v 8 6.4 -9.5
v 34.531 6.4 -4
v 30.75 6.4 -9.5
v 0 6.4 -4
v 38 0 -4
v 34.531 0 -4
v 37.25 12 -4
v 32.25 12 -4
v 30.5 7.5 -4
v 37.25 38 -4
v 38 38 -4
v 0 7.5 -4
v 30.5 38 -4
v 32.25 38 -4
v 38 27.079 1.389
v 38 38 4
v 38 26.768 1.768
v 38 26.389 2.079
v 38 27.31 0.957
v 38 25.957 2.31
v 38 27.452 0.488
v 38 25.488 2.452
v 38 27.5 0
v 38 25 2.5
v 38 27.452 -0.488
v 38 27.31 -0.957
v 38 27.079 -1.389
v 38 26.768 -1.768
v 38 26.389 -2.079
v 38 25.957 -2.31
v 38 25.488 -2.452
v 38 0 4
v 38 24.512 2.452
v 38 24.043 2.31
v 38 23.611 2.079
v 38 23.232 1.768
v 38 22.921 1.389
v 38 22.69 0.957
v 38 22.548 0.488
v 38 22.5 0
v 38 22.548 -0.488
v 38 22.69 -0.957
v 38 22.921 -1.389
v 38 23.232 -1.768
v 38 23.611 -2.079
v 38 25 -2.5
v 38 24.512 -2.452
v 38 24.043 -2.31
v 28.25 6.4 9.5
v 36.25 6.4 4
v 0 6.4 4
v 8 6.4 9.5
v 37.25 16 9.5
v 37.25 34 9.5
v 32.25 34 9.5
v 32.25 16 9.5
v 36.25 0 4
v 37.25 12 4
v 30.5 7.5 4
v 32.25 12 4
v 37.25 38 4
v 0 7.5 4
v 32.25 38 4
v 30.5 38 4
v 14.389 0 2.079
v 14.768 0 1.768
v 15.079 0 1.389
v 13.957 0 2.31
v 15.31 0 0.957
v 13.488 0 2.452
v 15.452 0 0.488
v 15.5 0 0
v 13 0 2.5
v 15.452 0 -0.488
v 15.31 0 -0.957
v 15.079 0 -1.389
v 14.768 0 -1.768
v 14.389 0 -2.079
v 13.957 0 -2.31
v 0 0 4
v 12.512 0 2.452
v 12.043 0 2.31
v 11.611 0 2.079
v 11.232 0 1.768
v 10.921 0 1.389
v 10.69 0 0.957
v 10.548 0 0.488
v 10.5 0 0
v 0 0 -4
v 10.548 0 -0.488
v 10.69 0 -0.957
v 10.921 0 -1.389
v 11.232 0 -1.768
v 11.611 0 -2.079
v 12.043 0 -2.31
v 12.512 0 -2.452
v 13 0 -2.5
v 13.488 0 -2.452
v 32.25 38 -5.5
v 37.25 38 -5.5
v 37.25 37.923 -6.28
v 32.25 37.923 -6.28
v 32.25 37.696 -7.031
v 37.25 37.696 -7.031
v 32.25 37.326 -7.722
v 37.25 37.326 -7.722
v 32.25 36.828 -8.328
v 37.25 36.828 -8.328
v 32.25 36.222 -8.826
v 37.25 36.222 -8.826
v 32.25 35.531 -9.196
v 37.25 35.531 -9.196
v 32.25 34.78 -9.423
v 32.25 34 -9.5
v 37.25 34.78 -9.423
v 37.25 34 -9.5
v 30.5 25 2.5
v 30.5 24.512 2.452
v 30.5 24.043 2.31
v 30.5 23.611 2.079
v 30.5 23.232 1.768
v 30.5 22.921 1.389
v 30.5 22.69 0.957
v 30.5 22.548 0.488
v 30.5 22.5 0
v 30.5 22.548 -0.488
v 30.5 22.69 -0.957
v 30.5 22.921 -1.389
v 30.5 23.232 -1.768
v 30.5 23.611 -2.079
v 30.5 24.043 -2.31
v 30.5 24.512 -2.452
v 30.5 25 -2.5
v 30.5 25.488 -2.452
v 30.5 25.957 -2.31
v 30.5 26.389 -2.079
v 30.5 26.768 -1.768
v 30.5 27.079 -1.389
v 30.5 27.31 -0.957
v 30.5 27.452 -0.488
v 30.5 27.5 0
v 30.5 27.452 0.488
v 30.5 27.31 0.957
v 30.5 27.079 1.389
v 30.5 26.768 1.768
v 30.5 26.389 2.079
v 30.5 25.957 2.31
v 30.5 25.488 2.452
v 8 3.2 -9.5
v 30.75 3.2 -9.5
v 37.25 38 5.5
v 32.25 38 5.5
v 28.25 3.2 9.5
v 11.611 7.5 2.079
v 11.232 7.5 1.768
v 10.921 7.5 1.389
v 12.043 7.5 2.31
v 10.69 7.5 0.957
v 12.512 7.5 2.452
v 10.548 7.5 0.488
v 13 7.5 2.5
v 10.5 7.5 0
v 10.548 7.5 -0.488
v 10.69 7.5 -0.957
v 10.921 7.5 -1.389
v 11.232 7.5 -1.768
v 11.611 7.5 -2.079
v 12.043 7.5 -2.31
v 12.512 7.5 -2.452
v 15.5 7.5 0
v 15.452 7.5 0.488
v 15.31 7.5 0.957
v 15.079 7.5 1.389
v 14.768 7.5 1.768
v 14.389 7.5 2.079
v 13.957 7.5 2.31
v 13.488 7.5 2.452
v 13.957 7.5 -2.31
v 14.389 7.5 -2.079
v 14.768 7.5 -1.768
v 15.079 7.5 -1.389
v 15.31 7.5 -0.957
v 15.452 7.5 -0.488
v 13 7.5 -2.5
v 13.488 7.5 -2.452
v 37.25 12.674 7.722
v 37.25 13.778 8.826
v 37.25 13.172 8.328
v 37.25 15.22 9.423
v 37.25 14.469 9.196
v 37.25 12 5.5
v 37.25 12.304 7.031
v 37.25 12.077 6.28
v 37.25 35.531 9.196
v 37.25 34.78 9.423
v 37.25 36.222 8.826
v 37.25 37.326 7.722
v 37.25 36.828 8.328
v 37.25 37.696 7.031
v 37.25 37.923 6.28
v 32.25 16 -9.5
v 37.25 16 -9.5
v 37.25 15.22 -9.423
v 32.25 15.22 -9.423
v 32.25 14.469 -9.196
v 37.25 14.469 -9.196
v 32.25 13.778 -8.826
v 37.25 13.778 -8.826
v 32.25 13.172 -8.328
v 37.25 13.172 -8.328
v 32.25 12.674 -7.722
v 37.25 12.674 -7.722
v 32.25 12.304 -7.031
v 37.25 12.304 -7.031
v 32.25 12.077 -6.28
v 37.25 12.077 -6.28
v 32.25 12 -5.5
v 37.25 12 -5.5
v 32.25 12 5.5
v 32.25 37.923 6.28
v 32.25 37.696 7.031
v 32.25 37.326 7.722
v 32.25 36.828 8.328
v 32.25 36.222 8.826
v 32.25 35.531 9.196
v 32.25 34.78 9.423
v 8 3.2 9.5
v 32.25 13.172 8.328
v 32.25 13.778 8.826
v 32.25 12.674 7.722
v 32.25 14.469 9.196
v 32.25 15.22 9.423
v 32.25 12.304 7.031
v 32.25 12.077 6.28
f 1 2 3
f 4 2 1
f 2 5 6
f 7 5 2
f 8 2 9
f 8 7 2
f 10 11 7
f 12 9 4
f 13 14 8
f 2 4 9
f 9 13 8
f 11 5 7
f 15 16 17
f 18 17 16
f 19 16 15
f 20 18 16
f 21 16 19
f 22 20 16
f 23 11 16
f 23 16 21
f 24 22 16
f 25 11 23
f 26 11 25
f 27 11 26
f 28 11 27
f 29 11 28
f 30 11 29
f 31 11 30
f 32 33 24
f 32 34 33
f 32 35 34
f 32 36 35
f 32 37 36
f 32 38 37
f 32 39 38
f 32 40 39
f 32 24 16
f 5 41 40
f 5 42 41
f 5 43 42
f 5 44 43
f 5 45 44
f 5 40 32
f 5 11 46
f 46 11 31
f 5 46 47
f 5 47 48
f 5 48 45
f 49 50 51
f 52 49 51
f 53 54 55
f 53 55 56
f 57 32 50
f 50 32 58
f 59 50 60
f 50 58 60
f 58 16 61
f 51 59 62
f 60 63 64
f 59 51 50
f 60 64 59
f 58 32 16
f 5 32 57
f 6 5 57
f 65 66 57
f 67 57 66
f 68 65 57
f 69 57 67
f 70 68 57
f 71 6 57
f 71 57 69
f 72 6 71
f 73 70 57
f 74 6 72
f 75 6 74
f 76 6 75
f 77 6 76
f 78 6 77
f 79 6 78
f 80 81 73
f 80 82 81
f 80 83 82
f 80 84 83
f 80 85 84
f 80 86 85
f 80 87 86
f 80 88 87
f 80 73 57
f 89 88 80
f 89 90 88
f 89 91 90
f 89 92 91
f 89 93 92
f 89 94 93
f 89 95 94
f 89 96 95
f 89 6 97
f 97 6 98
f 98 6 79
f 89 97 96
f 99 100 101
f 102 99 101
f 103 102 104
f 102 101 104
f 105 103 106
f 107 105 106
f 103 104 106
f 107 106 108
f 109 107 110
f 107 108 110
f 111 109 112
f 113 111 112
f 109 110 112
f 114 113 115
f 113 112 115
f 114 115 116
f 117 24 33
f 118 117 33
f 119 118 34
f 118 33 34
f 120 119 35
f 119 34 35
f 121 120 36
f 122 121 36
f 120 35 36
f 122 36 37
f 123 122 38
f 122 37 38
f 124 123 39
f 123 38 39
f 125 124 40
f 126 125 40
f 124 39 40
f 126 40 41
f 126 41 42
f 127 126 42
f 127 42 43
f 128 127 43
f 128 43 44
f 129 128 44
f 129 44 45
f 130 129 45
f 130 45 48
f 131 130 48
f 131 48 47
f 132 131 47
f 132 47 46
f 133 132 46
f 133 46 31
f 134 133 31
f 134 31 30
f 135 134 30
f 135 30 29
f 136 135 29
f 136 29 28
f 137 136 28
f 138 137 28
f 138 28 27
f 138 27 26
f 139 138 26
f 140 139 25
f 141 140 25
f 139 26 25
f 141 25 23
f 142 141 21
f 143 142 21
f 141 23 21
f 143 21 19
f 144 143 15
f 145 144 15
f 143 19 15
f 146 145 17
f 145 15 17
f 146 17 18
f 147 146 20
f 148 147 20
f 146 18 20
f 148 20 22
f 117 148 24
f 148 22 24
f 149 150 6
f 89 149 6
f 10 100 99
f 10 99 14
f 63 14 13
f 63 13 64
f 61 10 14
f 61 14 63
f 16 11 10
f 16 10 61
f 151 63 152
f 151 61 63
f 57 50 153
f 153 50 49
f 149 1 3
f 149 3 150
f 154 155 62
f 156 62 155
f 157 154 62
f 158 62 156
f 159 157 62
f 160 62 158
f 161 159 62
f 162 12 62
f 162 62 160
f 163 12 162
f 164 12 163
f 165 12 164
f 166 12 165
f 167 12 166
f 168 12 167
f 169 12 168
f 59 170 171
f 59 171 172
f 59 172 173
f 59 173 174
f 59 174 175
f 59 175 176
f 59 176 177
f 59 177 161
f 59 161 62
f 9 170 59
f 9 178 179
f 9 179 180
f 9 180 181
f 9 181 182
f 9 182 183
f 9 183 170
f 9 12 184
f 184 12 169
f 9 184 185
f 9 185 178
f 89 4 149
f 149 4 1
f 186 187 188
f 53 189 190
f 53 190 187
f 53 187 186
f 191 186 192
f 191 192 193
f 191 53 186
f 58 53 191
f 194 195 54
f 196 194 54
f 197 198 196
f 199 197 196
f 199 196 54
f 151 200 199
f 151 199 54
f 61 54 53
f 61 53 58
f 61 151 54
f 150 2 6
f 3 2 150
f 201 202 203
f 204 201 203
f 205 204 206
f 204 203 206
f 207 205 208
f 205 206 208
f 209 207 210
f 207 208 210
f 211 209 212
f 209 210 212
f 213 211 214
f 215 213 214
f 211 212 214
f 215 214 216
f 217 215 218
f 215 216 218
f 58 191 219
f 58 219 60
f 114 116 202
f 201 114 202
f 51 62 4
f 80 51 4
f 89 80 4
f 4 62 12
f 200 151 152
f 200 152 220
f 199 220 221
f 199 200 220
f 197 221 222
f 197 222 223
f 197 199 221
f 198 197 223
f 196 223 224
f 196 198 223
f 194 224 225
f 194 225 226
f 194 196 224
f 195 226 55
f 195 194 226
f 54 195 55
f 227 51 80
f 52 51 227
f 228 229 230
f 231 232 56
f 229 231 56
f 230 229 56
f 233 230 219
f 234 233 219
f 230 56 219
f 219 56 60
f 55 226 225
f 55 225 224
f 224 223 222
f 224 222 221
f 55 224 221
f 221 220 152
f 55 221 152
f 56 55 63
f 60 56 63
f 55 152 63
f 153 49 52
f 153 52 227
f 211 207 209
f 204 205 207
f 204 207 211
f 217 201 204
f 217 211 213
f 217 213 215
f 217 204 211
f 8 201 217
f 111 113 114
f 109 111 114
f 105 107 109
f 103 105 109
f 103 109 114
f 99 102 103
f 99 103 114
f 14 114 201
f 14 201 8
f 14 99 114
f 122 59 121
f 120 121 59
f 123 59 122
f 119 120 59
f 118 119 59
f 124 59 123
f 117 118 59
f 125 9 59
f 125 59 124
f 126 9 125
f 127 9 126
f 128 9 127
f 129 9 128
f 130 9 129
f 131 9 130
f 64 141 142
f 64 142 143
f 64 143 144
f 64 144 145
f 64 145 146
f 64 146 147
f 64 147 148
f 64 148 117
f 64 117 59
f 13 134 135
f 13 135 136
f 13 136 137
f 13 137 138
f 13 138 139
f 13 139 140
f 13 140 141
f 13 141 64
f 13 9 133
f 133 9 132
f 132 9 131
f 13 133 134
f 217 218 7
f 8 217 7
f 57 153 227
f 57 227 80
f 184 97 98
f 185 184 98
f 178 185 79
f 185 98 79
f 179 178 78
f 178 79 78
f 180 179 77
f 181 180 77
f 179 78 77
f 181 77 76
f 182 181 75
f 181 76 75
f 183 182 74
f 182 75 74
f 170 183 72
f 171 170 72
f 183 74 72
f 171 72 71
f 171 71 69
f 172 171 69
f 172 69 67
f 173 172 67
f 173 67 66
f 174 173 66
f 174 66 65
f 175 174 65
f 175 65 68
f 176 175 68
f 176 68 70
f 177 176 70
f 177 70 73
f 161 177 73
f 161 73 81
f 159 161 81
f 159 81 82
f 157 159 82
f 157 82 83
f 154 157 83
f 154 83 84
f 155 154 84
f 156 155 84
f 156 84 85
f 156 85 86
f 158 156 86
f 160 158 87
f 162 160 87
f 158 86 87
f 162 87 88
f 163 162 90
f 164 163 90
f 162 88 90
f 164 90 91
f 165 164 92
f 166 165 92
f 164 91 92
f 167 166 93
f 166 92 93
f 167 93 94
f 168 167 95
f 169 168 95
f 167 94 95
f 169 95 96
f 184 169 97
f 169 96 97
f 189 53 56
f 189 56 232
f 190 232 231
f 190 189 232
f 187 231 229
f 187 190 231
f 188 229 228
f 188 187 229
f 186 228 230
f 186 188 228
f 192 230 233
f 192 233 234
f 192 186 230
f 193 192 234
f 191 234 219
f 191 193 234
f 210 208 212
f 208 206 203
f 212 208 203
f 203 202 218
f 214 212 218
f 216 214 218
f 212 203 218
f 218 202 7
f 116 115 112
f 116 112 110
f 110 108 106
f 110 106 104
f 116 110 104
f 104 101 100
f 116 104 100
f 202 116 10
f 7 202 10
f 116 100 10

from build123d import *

# Parameters (mm, degrees)
EXTRUDE_1_DEPTH        = 4
EXTRUDE_1_DEPTH_BACK   = 4
EXTRUDE_2_DEPTH        = 36.25
CHAMFER_1_SIZE         = 8
CHAMFER_1_SIZE_2       = 5.5
EXTRUDE_3_DEPTH        = 2.5
EXTRUDE_3_DEPTH_BACK   = 2.5
HOLE_WIZARD_M6_1_D     = 5
HOLE_WIZARD_M6_1_DEPTH = 17
HOLE_WIZARD_M6_1_TIP   = 1.502151548
HOLE_WIZARD_M6_2_D     = 5
HOLE_WIZARD_M6_2_DEPTH = 17
HOLE_WIZARD_M6_2_TIP   = 1.502151548


with BuildPart() as part:
    # 草图1 → 凸台-拉伸1 (new, two sides: drawn at the far end of the back side and taken through both)
    with BuildSketch(Plane.XY.offset(-EXTRUDE_1_DEPTH_BACK)):
        Polygon((0, 7.5), (30.5, 7.5), (30.5, 38), (38, 38), (38, 0), (0, 0), align=None)
    extrude(amount=EXTRUDE_1_DEPTH + EXTRUDE_1_DEPTH_BACK)

    # 草图2 → 凸台-拉伸2 (add)
    with BuildSketch(Plane.ZY):
        Polygon((4, 6.4), (9.5, 6.4), (9.5, 3.2), (4, 0), align=None)
        Polygon((-4, 0), (-4, 6.4), (-9.5, 6.4), (-9.5, 3.2), align=None)
    extrude(amount=-EXTRUDE_2_DEPTH)

    # 倒角1
    # the kernel refuses this chamfer: 8, 5.5 mm, written as the material it takes off along each edge
    with BuildSketch(Plane(origin=(36.25, 27.064204354, -9.5), x_dir=(0.021932761143399794, 0, 0.9997594480616957), z_dir=(0, -1, 0))) as chamfer_1_piece_1_section:
        Polygon((CHAMFER_1_SIZE * 0.999759448062, CHAMFER_1_SIZE * 0.0219327611434), (-CHAMFER_1_SIZE_2 * 0.0219327611434, CHAMFER_1_SIZE_2 * 0.999759448062), (0, 0), align=None)
    chamfer_1_piece_1 = extrude(amount=44.528408708, mode=Mode.PRIVATE)
    chamfer_1_piece_1 = split(chamfer_1_piece_1, bisect_by=Plane(origin=(34.285815681, 4.8, -4), z_dir=(0, 0, -1)), keep=Keep.TOP, mode=Mode.PRIVATE)
    add(chamfer_1_piece_1, mode=Mode.SUBTRACT)
    with BuildSketch(Plane(origin=(36.25, 27.064204354, 9.5), x_dir=(0.046364447759701236, 0, -0.9989245907394302), z_dir=(0, -1, 0))) as chamfer_1_piece_2_section:
        Polygon((CHAMFER_1_SIZE_2 * 0.998924590739, -CHAMFER_1_SIZE_2 * 0.0463644477597), (-CHAMFER_1_SIZE * 0.0463644477597, -CHAMFER_1_SIZE * 0.998924590739), (0, 0), align=None)
    chamfer_1_piece_2 = extrude(amount=44.528408708, mode=Mode.PRIVATE)
    chamfer_1_piece_2 = split(chamfer_1_piece_2, bisect_by=Plane(origin=(33.577095366, 4.8, 4), z_dir=(0, 0, 1)), keep=Keep.TOP, mode=Mode.PRIVATE)
    add(chamfer_1_piece_2, mode=Mode.SUBTRACT)
    with BuildSketch(Plane(origin=(0, 27.064204354, 9.5), x_dir=(-0.046364447759701714, 0, -0.9989245907394302), z_dir=(0, -1, 0))) as chamfer_1_piece_3:
        Polygon((CHAMFER_1_SIZE_2 * 0.998924590739, CHAMFER_1_SIZE_2 * 0.0463644477597), (-CHAMFER_1_SIZE * 0.0463644477597, CHAMFER_1_SIZE * 0.998924590739), (0, 0), align=None)
    extrude(amount=44.528408708, mode=Mode.SUBTRACT)
    with BuildSketch(Plane(origin=(0, 27.064204354, -9.5), x_dir=(-0.046364447759701714, 0, 0.9989245907394302), z_dir=(0, -1, 0))) as chamfer_1_piece_4:
        Polygon((CHAMFER_1_SIZE_2 * 0.998924590739, -CHAMFER_1_SIZE_2 * 0.0463644477597), (-CHAMFER_1_SIZE * 0.0463644477597, -CHAMFER_1_SIZE * 0.998924590739), (0, 0), align=None)
    extrude(amount=44.528408708, mode=Mode.SUBTRACT)

    # 草图3 → 凸台-拉伸3 (add, two sides: drawn at the far end of the back side and taken through both)
    with BuildSketch(Plane.ZY.offset(-34.75).offset(-EXTRUDE_3_DEPTH_BACK)):
        with BuildLine():
            Line((4, 38), (5.5, 38))
            ThreePointArc((5.5, 38), (8.328427125, 36.828427125), (9.5, 34))
            Line((9.5, 34), (9.5, 16))
            ThreePointArc((9.5, 16), (8.328427125, 13.171572875), (5.5, 12))
            Line((5.5, 12), (4, 12))
            Line((4, 12), (4, 38))
        make_face()
        with BuildLine():
            Line((-9.5, 34), (-9.5, 16))
            ThreePointArc((-9.5, 16), (-8.328427125, 13.171572875), (-5.5, 12))
            Line((-5.5, 12), (-4, 12))
            Line((-4, 12), (-4, 38))
            Line((-4, 38), (-5.5, 38))
            ThreePointArc((-5.5, 38), (-8.328427125, 36.828427125), (-9.5, 34))
        make_face()
    extrude(amount=EXTRUDE_3_DEPTH + EXTRUDE_3_DEPTH_BACK)

    # M6 螺纹孔1
    with Locations(Plane(origin=(30.5, 25, 0), x_dir=(0, 0, -1), z_dir=(-1, 0, 0))):
        with Locations((0, 0)):
            Hole(HOLE_WIZARD_M6_1_D / 2, depth=HOLE_WIZARD_M6_1_DEPTH)
            with Locations((0, 0, -(HOLE_WIZARD_M6_1_DEPTH + HOLE_WIZARD_M6_1_TIP / 2))):  # 118° drill point
                Cone(0, HOLE_WIZARD_M6_1_D / 2, HOLE_WIZARD_M6_1_TIP, mode=Mode.SUBTRACT)

    # M6 螺纹孔2
    with Locations(Plane(origin=(13, 7.5, 0), x_dir=(0, 0, 1), z_dir=(0, 1, 0))):
        with Locations((0, 0)):
            Hole(HOLE_WIZARD_M6_2_D / 2, depth=HOLE_WIZARD_M6_2_DEPTH)
            with Locations((0, 0, -(HOLE_WIZARD_M6_2_DEPTH + HOLE_WIZARD_M6_2_TIP / 2))):  # 118° drill point
                Cone(0, HOLE_WIZARD_M6_2_D / 2, HOLE_WIZARD_M6_2_TIP, mode=Mode.SUBTRACT)


solid = part.part
